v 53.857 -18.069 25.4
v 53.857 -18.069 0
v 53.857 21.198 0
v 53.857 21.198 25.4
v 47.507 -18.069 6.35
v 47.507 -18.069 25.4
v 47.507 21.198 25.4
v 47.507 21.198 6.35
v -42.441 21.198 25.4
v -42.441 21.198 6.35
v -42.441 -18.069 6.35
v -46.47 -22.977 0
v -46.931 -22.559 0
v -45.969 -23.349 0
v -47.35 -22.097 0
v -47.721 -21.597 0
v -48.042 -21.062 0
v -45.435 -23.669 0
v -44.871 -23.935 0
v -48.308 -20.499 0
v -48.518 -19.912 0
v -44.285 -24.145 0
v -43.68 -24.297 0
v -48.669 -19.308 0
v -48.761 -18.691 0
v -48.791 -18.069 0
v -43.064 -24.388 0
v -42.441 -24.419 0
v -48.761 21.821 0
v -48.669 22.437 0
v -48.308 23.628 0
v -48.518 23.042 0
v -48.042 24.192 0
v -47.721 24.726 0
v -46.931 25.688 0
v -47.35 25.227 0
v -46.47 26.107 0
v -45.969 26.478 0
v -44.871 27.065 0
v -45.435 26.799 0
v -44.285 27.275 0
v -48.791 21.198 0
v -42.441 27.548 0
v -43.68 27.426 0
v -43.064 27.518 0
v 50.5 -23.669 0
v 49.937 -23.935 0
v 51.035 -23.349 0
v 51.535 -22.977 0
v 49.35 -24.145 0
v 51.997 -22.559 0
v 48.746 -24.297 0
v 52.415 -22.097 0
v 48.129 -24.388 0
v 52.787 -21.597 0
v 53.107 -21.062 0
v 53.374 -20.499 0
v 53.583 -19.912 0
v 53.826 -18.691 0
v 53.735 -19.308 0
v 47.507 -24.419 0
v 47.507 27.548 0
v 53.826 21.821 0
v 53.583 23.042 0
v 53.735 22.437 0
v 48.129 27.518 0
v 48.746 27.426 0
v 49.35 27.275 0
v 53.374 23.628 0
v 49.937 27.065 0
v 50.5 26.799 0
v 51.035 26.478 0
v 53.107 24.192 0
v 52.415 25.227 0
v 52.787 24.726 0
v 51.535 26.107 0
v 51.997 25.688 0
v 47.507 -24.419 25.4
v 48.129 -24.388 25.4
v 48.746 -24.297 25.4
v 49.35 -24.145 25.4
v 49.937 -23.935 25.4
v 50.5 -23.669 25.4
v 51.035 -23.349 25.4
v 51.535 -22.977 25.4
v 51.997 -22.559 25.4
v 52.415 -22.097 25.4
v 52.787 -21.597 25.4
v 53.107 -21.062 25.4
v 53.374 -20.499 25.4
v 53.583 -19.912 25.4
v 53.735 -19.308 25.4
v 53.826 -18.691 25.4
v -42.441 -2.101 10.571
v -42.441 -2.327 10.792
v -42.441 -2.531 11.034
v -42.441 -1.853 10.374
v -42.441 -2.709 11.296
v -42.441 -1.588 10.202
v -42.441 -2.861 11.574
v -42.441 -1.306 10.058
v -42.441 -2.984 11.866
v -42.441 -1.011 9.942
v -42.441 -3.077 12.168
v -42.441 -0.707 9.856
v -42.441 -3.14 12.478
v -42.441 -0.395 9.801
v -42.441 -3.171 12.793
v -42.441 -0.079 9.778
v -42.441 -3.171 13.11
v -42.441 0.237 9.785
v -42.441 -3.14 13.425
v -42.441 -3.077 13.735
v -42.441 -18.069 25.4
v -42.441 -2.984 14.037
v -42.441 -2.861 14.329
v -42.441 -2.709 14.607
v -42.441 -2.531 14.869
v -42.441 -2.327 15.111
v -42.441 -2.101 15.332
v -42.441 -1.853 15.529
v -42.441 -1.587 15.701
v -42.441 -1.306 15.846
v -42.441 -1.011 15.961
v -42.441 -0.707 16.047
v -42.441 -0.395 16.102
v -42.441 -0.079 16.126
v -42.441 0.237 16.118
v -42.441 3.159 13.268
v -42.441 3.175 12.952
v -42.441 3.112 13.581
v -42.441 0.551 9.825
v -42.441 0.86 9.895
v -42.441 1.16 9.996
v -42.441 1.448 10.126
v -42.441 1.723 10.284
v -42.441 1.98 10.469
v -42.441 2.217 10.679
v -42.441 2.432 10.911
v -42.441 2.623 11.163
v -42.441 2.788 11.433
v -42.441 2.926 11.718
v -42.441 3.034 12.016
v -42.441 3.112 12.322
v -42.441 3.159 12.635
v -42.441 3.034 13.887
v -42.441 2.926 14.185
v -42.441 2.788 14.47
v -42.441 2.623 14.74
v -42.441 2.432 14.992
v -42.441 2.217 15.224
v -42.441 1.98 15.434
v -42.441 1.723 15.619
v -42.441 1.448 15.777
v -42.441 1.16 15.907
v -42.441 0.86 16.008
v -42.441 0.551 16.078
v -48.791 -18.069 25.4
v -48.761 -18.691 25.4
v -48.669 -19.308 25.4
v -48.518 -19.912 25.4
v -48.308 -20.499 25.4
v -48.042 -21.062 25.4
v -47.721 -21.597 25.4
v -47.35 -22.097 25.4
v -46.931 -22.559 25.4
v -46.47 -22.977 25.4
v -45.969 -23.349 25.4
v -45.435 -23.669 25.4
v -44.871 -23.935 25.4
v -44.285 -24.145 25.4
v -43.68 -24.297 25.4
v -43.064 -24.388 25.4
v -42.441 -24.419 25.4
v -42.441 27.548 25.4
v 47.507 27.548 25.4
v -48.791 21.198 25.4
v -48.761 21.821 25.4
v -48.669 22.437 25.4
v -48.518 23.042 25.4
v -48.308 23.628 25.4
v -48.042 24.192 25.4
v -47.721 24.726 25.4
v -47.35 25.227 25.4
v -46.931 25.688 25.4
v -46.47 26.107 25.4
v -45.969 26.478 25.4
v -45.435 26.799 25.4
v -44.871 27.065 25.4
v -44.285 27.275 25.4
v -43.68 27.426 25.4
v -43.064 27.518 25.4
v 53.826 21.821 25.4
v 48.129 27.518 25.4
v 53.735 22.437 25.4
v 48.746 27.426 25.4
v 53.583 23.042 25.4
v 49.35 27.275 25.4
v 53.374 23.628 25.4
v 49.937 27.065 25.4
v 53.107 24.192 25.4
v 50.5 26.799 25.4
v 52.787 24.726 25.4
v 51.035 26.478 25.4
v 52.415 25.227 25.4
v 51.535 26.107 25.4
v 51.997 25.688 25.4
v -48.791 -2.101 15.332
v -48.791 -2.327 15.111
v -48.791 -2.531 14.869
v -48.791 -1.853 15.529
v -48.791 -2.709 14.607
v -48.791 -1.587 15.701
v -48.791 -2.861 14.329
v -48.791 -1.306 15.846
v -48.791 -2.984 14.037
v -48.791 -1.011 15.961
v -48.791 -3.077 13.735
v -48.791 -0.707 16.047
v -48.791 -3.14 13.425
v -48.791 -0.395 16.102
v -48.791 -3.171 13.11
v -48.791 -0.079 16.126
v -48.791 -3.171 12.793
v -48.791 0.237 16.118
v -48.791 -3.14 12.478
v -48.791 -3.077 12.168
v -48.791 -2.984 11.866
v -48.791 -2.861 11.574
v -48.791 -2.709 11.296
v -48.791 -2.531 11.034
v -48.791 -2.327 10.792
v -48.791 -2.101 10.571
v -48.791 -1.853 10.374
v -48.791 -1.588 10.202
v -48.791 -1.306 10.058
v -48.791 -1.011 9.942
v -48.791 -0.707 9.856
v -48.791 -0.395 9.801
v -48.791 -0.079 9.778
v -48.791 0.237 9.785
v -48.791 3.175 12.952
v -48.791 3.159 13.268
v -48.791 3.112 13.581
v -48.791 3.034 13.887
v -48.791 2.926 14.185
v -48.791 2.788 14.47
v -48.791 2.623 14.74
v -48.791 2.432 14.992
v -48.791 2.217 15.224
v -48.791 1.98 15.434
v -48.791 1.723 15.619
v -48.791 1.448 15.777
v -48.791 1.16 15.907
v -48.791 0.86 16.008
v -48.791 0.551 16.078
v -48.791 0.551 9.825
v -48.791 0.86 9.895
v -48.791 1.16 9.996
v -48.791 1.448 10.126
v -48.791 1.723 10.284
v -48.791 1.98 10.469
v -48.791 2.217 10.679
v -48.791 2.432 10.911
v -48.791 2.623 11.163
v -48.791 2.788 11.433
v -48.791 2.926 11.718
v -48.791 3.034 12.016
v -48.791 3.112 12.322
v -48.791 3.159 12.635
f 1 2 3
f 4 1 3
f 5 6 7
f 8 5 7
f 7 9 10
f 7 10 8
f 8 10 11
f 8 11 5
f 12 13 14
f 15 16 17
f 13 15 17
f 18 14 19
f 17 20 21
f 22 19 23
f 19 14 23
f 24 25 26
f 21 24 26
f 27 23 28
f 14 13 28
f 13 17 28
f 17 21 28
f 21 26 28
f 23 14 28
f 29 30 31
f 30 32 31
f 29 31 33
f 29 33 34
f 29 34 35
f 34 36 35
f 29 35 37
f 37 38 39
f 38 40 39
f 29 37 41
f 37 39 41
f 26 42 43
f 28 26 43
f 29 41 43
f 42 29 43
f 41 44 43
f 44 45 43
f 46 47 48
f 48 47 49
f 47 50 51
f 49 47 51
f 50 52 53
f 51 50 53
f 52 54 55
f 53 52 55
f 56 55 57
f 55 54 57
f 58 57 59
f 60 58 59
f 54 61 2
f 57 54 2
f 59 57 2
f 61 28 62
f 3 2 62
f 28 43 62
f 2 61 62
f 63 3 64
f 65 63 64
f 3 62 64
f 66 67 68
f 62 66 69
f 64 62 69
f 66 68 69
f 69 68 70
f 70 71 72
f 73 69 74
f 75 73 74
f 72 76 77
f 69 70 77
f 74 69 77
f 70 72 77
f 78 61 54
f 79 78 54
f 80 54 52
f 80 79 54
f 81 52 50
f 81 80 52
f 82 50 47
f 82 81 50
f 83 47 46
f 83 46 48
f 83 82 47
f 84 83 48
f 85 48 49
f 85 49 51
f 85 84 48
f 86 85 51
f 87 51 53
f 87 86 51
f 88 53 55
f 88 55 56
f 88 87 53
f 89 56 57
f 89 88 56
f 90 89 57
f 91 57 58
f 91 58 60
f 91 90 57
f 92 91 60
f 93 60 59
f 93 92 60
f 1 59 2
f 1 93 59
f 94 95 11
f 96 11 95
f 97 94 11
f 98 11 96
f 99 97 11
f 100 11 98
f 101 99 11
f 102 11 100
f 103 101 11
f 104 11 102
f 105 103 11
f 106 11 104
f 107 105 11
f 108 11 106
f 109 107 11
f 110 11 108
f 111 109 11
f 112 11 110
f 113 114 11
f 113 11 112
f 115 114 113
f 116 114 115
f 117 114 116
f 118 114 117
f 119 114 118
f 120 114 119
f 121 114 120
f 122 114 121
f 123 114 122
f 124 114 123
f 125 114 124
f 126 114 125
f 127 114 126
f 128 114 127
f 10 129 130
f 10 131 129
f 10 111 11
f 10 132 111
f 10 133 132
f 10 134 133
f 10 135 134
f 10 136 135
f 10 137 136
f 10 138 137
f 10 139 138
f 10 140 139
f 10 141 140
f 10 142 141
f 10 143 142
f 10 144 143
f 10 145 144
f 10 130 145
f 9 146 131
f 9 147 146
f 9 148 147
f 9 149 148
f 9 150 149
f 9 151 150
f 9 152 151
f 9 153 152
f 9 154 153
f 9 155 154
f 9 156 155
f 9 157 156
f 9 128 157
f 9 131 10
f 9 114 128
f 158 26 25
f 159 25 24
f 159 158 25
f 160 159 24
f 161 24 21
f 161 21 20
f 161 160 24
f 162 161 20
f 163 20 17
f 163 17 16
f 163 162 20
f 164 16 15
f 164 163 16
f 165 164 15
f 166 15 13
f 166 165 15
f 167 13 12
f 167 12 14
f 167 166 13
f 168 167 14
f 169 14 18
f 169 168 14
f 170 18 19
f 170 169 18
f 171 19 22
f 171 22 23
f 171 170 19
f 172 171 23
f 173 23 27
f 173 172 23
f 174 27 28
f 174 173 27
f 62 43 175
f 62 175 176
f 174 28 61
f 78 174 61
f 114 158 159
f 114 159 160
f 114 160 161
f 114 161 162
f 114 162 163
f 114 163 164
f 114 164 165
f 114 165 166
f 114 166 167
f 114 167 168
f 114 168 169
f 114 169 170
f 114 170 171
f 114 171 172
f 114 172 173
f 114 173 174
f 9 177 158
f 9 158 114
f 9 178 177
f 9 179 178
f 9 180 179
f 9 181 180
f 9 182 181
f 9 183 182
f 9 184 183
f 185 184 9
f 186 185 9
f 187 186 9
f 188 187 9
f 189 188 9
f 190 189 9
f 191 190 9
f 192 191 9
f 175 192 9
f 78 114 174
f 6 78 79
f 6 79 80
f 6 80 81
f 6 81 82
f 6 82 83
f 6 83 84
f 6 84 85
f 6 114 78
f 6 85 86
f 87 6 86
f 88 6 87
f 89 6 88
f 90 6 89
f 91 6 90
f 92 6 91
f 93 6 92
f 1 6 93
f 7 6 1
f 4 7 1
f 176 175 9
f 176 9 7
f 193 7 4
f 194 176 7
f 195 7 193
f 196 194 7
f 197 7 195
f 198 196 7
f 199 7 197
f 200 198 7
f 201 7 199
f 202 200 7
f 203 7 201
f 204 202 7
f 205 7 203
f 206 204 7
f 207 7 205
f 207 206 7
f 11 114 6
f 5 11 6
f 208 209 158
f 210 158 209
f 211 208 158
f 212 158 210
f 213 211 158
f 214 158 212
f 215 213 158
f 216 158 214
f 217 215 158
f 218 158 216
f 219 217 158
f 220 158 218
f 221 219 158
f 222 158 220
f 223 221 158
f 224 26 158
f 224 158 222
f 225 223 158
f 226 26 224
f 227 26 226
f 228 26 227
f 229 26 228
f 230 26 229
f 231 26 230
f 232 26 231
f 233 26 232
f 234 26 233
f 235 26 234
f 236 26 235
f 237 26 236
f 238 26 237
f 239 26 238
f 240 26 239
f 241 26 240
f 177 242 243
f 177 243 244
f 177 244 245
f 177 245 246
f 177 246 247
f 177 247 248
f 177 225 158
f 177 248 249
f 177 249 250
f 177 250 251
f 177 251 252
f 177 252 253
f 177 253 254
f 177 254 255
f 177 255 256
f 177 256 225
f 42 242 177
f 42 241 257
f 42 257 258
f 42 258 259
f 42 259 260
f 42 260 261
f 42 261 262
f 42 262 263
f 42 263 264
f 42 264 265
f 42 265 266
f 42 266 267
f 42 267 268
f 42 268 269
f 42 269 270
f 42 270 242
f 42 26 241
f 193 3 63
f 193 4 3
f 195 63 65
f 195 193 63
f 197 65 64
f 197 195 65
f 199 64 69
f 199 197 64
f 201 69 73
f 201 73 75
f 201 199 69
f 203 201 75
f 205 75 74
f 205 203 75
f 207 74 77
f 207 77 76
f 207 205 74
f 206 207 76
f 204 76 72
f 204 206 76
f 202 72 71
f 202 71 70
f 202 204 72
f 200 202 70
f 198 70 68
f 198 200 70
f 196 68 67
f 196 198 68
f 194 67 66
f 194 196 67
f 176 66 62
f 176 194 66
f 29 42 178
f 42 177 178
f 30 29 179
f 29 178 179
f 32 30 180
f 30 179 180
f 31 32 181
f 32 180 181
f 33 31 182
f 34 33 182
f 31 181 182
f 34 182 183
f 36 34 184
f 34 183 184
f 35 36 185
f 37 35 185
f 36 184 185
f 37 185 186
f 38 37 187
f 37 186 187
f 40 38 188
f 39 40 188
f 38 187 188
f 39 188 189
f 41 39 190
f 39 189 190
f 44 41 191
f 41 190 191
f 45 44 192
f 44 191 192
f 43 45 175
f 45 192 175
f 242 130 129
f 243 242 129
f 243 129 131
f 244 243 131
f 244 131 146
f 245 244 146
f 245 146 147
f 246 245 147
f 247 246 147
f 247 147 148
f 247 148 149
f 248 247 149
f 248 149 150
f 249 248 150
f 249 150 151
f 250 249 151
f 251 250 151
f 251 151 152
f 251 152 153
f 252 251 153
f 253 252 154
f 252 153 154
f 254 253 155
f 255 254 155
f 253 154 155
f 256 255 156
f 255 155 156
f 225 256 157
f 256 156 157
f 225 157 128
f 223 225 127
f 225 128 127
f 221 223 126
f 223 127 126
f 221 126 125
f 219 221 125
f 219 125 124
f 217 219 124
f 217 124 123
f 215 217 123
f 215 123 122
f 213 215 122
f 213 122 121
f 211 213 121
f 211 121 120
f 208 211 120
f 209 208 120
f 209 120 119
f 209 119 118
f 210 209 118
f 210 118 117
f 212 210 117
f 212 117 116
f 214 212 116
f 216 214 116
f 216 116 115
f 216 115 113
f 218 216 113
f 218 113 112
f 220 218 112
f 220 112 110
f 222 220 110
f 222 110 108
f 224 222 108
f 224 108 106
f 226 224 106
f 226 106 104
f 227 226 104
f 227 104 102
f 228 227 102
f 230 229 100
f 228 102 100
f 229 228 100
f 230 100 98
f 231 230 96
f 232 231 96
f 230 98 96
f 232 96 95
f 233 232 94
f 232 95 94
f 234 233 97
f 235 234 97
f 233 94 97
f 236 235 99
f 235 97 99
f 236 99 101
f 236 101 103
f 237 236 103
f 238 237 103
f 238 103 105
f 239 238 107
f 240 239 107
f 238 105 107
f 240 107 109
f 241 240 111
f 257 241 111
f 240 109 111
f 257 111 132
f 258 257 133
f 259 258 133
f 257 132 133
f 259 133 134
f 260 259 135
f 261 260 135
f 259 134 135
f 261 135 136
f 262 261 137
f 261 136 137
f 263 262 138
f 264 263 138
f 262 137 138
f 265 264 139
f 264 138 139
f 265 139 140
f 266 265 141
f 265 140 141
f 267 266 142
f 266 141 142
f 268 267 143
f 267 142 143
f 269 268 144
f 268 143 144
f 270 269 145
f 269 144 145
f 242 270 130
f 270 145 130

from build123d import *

# Parameters (mm, degrees)
F0_W     = 102.648225
F0_H     = 51.967123
F1_DEPTH = 25.4
F2_R     = 6.35
F3_W     = 89.948225
F3_H     = 39.267123
F4_DEPTH = 19.05
F6_D     = 6.35
F6_DEPTH = 12.7


with BuildPart() as f1:
    # F0 (on Top) → F1 (new body)
    with BuildSketch(Plane.XY):
        with Locations((2.532753, 1.564751)):
            Rectangle(F0_W, F0_H)
    extrude(amount=F1_DEPTH)

    # F2
    f2_edges = [f1.edges().sort_by_distance(p)[0] for p in [
        (-48.79136, -24.41881, 12.7),
        (-48.79136, 27.548313, 12.7),
        (53.856865, -24.41881, 12.7),
        (53.856865, 27.548313, 12.7),
    ]]
    fillet(f2_edges, radius=F2_R)

    # F3 (on face) → F4 (cut)
    with BuildSketch(Plane.XY.offset(25.4)):
        with Locations((2.532753, 1.564751)):
            Rectangle(F3_W, F3_H)
    extrude(amount=-F4_DEPTH, mode=Mode.SUBTRACT)

    # F6
    with Locations(Plane(origin=(-48.79136, 0, 0), x_dir=(0, -1, 0), z_dir=(-1, 0, 0))):
        with Locations((0, 12.951535)):
            Hole(F6_D / 2, depth=F6_DEPTH)


solid = f1.part
